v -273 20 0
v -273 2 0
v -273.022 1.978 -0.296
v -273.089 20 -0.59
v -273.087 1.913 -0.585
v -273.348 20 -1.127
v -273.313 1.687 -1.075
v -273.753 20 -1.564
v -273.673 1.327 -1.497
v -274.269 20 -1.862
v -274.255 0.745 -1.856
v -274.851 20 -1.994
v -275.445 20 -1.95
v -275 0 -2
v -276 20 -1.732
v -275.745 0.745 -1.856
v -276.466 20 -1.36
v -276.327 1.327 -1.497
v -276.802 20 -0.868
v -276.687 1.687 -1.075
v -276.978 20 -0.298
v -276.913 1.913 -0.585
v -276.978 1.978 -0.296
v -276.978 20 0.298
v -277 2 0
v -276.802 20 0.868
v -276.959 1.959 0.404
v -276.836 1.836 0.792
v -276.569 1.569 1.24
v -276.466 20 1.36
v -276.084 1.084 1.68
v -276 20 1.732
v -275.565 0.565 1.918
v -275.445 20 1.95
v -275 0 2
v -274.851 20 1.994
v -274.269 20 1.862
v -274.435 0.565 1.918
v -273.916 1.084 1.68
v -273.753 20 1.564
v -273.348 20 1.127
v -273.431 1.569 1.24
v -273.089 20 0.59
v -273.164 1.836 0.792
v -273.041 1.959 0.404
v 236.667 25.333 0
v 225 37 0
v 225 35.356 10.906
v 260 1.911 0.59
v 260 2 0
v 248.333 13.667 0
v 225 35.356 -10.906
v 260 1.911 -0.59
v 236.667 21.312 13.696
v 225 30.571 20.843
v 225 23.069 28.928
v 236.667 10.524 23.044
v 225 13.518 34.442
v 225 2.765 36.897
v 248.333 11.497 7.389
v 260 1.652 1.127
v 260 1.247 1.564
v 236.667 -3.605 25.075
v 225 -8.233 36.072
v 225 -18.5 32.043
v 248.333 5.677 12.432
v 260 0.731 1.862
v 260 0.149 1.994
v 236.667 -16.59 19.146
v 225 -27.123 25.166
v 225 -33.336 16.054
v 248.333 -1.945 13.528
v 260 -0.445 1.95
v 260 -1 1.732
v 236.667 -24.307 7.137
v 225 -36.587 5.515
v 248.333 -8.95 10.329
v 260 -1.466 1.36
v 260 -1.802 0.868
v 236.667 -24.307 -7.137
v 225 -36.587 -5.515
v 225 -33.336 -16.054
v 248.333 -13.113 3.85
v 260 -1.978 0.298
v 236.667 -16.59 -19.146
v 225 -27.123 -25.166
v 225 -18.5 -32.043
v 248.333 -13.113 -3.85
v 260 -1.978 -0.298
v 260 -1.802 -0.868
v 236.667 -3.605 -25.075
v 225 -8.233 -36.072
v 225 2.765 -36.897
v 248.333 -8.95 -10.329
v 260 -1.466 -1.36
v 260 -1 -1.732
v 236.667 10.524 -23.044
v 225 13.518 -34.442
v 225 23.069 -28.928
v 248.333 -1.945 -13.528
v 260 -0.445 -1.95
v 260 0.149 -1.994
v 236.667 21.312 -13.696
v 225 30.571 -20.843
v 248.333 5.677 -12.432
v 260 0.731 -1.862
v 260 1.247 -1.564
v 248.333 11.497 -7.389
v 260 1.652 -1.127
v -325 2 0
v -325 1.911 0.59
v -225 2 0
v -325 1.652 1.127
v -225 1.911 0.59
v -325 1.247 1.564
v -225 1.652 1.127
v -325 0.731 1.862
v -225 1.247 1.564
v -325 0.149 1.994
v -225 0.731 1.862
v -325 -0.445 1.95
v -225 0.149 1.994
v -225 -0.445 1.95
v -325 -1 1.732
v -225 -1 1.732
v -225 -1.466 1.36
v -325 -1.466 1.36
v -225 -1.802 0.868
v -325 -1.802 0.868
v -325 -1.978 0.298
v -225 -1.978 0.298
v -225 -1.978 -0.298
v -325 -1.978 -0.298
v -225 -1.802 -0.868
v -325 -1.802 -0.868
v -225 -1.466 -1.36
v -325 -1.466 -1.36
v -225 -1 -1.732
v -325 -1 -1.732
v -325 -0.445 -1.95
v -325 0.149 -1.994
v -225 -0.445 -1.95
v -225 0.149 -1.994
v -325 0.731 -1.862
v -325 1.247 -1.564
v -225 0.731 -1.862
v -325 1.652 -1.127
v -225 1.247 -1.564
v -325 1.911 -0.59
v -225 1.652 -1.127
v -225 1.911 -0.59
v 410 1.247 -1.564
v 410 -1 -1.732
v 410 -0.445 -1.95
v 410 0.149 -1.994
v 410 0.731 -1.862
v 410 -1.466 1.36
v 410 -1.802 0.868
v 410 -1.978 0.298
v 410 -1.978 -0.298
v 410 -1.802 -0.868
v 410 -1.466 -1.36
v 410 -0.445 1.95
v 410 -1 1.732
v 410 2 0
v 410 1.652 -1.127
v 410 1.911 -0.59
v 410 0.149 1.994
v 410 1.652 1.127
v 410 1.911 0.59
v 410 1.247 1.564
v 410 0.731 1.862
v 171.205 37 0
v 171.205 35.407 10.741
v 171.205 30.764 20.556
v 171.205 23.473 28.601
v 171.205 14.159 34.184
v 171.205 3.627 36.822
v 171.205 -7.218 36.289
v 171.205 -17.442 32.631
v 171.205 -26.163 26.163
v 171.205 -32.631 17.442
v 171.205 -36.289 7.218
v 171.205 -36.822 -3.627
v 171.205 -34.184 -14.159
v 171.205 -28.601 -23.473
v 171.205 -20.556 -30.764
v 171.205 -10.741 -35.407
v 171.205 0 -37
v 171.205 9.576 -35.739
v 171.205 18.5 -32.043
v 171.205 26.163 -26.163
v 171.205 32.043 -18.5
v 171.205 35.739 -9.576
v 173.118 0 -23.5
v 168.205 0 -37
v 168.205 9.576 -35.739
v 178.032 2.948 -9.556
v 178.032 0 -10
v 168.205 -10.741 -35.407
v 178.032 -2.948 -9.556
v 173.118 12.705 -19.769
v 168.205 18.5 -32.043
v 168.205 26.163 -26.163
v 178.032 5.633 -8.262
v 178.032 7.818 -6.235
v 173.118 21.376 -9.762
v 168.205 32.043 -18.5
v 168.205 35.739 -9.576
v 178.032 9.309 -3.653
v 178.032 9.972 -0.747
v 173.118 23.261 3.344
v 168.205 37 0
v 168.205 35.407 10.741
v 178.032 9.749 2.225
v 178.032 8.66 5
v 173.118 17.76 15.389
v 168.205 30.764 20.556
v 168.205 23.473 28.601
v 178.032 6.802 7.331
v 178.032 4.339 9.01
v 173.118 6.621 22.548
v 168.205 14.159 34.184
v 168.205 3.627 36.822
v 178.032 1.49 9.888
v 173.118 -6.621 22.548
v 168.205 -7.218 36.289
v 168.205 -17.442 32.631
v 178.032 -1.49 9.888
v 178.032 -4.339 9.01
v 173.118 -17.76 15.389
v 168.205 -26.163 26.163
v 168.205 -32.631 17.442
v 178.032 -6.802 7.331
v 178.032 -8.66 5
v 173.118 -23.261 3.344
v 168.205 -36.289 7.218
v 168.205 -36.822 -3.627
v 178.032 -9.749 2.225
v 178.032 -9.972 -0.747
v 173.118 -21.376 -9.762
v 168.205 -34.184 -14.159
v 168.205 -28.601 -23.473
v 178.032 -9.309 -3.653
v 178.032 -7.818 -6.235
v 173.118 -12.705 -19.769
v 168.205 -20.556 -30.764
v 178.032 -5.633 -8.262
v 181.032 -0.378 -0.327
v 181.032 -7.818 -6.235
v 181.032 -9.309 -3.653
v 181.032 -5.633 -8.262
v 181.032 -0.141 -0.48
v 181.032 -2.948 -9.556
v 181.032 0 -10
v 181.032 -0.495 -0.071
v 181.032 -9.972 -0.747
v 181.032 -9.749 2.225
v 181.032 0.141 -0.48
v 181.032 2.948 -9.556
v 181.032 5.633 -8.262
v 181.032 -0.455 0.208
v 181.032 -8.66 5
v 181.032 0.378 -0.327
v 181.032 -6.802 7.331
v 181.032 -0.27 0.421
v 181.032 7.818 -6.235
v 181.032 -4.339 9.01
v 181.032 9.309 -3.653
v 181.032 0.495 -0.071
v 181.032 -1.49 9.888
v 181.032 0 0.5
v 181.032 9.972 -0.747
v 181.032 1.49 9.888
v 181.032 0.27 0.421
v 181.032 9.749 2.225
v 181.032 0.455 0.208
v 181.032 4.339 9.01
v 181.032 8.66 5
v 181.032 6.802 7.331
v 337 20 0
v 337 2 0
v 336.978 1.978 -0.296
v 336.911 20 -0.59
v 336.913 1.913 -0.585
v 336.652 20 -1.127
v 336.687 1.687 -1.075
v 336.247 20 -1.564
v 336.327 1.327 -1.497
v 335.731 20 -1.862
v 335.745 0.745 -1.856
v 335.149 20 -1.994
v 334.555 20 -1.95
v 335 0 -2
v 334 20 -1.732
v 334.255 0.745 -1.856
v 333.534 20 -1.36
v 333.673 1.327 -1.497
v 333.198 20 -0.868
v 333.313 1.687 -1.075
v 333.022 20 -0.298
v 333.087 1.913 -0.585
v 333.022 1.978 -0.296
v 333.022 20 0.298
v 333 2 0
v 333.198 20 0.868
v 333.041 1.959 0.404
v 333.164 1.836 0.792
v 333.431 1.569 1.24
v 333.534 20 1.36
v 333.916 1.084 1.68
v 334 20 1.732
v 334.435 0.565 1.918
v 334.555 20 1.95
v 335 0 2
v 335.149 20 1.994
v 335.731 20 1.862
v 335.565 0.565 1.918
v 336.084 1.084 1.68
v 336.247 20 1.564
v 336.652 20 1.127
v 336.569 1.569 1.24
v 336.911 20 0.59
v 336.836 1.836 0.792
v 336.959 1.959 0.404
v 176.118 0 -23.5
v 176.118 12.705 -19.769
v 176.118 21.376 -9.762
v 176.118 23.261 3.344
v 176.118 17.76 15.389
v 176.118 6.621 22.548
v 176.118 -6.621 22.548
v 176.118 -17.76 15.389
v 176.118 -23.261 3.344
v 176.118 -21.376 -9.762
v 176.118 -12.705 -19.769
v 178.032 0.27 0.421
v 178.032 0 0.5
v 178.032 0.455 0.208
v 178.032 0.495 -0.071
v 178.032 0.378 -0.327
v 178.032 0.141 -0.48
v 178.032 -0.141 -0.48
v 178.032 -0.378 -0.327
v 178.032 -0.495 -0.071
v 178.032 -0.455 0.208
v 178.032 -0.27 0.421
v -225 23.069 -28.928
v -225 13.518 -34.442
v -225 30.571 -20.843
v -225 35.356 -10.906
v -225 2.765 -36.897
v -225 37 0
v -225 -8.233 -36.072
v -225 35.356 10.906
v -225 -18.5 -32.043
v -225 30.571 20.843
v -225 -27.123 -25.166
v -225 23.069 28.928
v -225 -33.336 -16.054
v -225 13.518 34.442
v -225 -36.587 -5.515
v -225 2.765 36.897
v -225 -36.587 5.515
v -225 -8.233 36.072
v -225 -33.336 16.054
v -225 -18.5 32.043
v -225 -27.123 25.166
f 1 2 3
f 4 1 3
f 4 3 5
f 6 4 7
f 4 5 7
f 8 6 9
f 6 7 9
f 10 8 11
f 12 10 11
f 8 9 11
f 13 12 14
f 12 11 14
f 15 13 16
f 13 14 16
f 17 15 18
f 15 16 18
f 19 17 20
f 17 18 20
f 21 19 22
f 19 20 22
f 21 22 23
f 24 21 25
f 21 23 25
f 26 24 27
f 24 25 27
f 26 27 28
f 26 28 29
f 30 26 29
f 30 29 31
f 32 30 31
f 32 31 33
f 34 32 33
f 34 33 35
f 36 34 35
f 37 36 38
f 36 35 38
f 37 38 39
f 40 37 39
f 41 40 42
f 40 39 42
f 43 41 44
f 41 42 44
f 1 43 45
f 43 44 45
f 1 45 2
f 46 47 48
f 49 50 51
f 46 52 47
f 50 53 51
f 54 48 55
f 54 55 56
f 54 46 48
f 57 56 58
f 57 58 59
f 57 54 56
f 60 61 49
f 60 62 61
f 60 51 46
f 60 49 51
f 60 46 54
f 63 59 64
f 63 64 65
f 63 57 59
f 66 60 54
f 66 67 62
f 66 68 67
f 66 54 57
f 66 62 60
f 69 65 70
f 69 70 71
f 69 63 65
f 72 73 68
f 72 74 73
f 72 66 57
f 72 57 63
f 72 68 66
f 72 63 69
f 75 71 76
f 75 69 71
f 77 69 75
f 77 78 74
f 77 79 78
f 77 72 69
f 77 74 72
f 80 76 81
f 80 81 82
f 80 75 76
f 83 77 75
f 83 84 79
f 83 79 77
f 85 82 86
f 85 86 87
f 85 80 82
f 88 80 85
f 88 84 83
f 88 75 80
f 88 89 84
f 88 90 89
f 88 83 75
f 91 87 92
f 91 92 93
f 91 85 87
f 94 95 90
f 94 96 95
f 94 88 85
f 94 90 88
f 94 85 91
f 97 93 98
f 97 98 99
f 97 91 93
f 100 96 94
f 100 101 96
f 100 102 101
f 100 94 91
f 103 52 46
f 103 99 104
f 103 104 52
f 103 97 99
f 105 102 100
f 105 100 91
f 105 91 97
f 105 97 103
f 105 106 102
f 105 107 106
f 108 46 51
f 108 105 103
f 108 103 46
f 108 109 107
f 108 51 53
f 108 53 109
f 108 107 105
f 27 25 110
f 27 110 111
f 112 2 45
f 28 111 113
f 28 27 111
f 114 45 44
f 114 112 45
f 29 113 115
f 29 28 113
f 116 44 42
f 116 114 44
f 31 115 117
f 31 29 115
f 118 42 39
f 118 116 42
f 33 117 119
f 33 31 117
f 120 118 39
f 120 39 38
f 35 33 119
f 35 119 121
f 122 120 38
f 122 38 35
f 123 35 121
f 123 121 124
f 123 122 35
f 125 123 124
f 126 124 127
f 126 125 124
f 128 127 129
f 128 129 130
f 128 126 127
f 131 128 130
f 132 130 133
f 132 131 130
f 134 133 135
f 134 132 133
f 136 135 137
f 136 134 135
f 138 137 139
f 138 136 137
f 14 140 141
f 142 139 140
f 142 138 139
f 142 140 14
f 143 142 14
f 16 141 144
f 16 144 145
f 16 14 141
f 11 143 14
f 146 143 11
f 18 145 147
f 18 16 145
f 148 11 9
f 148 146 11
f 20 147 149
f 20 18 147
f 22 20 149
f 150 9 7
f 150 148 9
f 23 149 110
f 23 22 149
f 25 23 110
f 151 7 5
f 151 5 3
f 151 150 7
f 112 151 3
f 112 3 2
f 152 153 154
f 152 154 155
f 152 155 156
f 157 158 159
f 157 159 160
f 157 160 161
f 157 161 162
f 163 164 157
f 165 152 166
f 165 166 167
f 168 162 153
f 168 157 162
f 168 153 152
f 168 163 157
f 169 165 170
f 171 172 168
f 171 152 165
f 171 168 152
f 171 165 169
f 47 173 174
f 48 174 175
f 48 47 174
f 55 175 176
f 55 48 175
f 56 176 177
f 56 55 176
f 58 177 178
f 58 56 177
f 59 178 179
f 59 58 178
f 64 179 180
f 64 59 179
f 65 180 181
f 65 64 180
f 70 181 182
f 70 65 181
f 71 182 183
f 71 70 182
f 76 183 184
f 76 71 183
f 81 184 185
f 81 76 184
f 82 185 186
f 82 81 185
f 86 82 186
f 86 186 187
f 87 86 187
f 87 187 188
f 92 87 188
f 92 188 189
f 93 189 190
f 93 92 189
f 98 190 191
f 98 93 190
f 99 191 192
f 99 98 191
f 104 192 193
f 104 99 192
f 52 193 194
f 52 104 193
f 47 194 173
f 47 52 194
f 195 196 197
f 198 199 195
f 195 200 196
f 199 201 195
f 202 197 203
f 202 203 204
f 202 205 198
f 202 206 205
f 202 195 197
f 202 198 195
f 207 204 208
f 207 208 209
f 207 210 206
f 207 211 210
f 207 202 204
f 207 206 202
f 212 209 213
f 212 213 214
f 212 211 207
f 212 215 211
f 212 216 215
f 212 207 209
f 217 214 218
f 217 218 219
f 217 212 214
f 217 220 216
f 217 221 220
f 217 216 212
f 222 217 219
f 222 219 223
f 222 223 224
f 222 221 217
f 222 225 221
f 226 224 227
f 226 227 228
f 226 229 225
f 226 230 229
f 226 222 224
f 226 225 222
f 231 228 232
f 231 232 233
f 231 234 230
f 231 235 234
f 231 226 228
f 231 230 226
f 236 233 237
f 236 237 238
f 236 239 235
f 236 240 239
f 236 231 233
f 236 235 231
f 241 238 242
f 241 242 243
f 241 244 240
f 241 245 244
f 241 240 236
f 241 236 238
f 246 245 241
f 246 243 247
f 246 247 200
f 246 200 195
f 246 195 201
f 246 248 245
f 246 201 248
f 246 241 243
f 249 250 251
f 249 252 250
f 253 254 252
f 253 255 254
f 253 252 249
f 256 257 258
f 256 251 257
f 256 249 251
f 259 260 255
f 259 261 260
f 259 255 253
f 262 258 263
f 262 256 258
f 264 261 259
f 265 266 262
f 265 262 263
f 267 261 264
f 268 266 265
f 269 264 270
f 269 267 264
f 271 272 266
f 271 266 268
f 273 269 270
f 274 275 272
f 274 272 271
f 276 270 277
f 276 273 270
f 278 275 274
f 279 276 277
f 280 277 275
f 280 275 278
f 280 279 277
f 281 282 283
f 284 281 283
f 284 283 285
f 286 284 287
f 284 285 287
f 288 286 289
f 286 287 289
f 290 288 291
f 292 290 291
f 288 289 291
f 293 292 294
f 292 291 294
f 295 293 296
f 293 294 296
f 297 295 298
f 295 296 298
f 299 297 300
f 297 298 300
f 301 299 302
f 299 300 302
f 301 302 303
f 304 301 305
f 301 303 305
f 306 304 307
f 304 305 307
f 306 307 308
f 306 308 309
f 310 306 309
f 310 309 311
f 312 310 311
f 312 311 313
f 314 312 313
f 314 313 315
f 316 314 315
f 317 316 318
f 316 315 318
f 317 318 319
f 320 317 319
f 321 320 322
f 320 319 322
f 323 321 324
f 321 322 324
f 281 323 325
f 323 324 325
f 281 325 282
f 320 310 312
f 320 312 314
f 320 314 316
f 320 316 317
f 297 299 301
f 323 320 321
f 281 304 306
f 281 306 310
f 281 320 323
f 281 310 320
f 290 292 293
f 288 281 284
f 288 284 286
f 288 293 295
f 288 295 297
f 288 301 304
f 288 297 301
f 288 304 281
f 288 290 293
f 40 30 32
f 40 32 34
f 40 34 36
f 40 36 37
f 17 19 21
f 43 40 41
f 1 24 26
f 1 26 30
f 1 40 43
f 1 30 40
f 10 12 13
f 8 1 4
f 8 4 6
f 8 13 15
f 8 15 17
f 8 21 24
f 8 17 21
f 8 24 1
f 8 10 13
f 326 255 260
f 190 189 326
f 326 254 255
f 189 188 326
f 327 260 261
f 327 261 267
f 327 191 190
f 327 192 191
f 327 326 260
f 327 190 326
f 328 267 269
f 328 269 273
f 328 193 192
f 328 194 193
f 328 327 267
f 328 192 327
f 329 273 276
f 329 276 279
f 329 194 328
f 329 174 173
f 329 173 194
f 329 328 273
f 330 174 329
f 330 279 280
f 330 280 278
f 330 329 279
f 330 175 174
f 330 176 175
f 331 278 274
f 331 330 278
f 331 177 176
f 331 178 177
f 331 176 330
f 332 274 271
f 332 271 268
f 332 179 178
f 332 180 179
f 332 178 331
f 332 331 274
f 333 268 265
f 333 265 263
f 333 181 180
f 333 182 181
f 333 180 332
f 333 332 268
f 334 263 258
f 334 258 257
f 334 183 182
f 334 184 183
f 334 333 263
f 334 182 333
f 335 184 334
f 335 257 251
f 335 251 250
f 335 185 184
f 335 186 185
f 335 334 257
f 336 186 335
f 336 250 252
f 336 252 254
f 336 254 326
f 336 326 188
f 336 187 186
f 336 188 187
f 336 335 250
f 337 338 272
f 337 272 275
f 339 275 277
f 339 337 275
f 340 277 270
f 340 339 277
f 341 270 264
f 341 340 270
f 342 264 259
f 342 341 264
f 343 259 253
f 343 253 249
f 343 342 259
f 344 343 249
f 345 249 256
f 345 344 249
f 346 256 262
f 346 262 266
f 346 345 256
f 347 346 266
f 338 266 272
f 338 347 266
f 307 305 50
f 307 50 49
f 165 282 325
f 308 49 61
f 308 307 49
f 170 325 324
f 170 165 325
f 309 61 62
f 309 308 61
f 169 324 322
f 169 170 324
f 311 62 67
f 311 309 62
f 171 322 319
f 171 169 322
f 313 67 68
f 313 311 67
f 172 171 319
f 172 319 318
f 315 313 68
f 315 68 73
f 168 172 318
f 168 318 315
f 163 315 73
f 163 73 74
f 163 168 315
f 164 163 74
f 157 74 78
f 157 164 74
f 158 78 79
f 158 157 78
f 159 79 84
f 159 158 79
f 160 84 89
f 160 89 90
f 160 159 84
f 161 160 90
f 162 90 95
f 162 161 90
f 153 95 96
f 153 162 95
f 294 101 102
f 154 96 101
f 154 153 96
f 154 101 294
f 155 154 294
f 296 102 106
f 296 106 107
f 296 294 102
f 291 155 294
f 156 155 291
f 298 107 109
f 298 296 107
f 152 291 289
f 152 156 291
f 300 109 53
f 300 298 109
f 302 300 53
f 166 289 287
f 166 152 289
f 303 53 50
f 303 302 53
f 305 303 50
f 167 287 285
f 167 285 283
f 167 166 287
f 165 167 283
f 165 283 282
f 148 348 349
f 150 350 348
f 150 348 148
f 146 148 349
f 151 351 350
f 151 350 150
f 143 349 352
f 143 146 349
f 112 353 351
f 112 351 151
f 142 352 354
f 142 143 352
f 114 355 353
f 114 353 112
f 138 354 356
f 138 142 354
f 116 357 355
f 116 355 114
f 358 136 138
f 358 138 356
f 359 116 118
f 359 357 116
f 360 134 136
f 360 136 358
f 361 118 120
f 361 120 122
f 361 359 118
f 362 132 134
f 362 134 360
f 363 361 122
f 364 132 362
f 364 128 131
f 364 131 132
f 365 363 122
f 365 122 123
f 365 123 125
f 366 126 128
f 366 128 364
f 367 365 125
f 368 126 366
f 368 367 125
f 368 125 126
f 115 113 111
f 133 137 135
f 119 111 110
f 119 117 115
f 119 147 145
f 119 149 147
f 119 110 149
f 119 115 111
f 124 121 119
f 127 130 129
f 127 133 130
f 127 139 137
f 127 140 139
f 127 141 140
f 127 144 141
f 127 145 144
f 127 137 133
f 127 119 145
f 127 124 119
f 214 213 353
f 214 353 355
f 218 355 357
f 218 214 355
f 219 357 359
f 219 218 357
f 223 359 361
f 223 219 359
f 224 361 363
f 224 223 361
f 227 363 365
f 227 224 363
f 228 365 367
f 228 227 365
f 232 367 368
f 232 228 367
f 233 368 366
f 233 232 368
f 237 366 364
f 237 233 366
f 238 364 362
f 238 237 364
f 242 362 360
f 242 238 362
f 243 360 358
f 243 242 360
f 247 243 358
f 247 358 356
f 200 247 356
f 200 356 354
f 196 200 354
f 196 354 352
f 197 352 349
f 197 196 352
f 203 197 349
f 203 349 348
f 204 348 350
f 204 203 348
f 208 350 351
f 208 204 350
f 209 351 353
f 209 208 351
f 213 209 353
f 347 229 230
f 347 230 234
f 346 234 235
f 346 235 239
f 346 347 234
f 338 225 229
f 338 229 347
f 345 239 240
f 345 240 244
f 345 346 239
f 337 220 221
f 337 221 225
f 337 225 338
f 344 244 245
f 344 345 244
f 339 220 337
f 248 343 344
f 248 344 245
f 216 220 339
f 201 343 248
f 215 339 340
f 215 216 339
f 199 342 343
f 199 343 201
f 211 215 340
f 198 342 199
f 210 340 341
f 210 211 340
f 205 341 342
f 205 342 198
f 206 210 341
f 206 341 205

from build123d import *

# Parameters (mm, degrees)
SKETCH2_R           = 2
BOSS_EXTRUDE1_DEPTH = 20
SKETCH5_R           = 0.5
CUT_EXTRUDE1_DEPTH  = 10


with BuildPart() as part:
    # Sketch1 → Revolve1 (revolve)
    with BuildSketch(Plane.XY):
        Polygon((-225, 2), (-225, 37), (225, 37), (260, 2), (410, 2), (410, 0), (-125, 0), (-325, 0), (-325, 2), align=None)
    revolve(axis=Axis((-125, 0, 0), (1, 0, 0)))

    # Sketch2 → Boss-Extrude1 (add)
    with BuildSketch(Plane(origin=(0, 0, 0), x_dir=(1, 0, 0), z_dir=(0, 1, 0))):
        with Locations((-275, 0)):
            Circle(SKETCH2_R)
        with Locations((335, 0)):
            Circle(SKETCH2_R)
    extrude(amount=BOSS_EXTRUDE1_DEPTH)


with BuildPart() as body_2:
    # Sketch4 → Revolve2 (revolve)
    with BuildSketch(Plane(origin=(0, 0, 0), x_dir=(1, 0, 0), z_dir=(0, 1, 0))):
        Polygon((181.031907012, 0), (181.031907012, 10), (171.204710687, 37), (168.204710687, 37), (178.031907012, 10), (178.031907012, 0), align=None)
    revolve(axis=Axis((178.031907012, 0, 0), (1, 0, 0)))

    # Sketch5 → Cut-Extrude1 (cut)
    with BuildSketch(Plane.ZY.offset(-178.031907012)):
        Circle(SKETCH5_R)
    extrude(amount=-CUT_EXTRUDE1_DEPTH, mode=Mode.SUBTRACT)


with BuildPart() as part_1:
    add(part.part)

    # Combine1: cut body 2
    add(body_2.part, mode=Mode.SUBTRACT)


solid = part_1.part
